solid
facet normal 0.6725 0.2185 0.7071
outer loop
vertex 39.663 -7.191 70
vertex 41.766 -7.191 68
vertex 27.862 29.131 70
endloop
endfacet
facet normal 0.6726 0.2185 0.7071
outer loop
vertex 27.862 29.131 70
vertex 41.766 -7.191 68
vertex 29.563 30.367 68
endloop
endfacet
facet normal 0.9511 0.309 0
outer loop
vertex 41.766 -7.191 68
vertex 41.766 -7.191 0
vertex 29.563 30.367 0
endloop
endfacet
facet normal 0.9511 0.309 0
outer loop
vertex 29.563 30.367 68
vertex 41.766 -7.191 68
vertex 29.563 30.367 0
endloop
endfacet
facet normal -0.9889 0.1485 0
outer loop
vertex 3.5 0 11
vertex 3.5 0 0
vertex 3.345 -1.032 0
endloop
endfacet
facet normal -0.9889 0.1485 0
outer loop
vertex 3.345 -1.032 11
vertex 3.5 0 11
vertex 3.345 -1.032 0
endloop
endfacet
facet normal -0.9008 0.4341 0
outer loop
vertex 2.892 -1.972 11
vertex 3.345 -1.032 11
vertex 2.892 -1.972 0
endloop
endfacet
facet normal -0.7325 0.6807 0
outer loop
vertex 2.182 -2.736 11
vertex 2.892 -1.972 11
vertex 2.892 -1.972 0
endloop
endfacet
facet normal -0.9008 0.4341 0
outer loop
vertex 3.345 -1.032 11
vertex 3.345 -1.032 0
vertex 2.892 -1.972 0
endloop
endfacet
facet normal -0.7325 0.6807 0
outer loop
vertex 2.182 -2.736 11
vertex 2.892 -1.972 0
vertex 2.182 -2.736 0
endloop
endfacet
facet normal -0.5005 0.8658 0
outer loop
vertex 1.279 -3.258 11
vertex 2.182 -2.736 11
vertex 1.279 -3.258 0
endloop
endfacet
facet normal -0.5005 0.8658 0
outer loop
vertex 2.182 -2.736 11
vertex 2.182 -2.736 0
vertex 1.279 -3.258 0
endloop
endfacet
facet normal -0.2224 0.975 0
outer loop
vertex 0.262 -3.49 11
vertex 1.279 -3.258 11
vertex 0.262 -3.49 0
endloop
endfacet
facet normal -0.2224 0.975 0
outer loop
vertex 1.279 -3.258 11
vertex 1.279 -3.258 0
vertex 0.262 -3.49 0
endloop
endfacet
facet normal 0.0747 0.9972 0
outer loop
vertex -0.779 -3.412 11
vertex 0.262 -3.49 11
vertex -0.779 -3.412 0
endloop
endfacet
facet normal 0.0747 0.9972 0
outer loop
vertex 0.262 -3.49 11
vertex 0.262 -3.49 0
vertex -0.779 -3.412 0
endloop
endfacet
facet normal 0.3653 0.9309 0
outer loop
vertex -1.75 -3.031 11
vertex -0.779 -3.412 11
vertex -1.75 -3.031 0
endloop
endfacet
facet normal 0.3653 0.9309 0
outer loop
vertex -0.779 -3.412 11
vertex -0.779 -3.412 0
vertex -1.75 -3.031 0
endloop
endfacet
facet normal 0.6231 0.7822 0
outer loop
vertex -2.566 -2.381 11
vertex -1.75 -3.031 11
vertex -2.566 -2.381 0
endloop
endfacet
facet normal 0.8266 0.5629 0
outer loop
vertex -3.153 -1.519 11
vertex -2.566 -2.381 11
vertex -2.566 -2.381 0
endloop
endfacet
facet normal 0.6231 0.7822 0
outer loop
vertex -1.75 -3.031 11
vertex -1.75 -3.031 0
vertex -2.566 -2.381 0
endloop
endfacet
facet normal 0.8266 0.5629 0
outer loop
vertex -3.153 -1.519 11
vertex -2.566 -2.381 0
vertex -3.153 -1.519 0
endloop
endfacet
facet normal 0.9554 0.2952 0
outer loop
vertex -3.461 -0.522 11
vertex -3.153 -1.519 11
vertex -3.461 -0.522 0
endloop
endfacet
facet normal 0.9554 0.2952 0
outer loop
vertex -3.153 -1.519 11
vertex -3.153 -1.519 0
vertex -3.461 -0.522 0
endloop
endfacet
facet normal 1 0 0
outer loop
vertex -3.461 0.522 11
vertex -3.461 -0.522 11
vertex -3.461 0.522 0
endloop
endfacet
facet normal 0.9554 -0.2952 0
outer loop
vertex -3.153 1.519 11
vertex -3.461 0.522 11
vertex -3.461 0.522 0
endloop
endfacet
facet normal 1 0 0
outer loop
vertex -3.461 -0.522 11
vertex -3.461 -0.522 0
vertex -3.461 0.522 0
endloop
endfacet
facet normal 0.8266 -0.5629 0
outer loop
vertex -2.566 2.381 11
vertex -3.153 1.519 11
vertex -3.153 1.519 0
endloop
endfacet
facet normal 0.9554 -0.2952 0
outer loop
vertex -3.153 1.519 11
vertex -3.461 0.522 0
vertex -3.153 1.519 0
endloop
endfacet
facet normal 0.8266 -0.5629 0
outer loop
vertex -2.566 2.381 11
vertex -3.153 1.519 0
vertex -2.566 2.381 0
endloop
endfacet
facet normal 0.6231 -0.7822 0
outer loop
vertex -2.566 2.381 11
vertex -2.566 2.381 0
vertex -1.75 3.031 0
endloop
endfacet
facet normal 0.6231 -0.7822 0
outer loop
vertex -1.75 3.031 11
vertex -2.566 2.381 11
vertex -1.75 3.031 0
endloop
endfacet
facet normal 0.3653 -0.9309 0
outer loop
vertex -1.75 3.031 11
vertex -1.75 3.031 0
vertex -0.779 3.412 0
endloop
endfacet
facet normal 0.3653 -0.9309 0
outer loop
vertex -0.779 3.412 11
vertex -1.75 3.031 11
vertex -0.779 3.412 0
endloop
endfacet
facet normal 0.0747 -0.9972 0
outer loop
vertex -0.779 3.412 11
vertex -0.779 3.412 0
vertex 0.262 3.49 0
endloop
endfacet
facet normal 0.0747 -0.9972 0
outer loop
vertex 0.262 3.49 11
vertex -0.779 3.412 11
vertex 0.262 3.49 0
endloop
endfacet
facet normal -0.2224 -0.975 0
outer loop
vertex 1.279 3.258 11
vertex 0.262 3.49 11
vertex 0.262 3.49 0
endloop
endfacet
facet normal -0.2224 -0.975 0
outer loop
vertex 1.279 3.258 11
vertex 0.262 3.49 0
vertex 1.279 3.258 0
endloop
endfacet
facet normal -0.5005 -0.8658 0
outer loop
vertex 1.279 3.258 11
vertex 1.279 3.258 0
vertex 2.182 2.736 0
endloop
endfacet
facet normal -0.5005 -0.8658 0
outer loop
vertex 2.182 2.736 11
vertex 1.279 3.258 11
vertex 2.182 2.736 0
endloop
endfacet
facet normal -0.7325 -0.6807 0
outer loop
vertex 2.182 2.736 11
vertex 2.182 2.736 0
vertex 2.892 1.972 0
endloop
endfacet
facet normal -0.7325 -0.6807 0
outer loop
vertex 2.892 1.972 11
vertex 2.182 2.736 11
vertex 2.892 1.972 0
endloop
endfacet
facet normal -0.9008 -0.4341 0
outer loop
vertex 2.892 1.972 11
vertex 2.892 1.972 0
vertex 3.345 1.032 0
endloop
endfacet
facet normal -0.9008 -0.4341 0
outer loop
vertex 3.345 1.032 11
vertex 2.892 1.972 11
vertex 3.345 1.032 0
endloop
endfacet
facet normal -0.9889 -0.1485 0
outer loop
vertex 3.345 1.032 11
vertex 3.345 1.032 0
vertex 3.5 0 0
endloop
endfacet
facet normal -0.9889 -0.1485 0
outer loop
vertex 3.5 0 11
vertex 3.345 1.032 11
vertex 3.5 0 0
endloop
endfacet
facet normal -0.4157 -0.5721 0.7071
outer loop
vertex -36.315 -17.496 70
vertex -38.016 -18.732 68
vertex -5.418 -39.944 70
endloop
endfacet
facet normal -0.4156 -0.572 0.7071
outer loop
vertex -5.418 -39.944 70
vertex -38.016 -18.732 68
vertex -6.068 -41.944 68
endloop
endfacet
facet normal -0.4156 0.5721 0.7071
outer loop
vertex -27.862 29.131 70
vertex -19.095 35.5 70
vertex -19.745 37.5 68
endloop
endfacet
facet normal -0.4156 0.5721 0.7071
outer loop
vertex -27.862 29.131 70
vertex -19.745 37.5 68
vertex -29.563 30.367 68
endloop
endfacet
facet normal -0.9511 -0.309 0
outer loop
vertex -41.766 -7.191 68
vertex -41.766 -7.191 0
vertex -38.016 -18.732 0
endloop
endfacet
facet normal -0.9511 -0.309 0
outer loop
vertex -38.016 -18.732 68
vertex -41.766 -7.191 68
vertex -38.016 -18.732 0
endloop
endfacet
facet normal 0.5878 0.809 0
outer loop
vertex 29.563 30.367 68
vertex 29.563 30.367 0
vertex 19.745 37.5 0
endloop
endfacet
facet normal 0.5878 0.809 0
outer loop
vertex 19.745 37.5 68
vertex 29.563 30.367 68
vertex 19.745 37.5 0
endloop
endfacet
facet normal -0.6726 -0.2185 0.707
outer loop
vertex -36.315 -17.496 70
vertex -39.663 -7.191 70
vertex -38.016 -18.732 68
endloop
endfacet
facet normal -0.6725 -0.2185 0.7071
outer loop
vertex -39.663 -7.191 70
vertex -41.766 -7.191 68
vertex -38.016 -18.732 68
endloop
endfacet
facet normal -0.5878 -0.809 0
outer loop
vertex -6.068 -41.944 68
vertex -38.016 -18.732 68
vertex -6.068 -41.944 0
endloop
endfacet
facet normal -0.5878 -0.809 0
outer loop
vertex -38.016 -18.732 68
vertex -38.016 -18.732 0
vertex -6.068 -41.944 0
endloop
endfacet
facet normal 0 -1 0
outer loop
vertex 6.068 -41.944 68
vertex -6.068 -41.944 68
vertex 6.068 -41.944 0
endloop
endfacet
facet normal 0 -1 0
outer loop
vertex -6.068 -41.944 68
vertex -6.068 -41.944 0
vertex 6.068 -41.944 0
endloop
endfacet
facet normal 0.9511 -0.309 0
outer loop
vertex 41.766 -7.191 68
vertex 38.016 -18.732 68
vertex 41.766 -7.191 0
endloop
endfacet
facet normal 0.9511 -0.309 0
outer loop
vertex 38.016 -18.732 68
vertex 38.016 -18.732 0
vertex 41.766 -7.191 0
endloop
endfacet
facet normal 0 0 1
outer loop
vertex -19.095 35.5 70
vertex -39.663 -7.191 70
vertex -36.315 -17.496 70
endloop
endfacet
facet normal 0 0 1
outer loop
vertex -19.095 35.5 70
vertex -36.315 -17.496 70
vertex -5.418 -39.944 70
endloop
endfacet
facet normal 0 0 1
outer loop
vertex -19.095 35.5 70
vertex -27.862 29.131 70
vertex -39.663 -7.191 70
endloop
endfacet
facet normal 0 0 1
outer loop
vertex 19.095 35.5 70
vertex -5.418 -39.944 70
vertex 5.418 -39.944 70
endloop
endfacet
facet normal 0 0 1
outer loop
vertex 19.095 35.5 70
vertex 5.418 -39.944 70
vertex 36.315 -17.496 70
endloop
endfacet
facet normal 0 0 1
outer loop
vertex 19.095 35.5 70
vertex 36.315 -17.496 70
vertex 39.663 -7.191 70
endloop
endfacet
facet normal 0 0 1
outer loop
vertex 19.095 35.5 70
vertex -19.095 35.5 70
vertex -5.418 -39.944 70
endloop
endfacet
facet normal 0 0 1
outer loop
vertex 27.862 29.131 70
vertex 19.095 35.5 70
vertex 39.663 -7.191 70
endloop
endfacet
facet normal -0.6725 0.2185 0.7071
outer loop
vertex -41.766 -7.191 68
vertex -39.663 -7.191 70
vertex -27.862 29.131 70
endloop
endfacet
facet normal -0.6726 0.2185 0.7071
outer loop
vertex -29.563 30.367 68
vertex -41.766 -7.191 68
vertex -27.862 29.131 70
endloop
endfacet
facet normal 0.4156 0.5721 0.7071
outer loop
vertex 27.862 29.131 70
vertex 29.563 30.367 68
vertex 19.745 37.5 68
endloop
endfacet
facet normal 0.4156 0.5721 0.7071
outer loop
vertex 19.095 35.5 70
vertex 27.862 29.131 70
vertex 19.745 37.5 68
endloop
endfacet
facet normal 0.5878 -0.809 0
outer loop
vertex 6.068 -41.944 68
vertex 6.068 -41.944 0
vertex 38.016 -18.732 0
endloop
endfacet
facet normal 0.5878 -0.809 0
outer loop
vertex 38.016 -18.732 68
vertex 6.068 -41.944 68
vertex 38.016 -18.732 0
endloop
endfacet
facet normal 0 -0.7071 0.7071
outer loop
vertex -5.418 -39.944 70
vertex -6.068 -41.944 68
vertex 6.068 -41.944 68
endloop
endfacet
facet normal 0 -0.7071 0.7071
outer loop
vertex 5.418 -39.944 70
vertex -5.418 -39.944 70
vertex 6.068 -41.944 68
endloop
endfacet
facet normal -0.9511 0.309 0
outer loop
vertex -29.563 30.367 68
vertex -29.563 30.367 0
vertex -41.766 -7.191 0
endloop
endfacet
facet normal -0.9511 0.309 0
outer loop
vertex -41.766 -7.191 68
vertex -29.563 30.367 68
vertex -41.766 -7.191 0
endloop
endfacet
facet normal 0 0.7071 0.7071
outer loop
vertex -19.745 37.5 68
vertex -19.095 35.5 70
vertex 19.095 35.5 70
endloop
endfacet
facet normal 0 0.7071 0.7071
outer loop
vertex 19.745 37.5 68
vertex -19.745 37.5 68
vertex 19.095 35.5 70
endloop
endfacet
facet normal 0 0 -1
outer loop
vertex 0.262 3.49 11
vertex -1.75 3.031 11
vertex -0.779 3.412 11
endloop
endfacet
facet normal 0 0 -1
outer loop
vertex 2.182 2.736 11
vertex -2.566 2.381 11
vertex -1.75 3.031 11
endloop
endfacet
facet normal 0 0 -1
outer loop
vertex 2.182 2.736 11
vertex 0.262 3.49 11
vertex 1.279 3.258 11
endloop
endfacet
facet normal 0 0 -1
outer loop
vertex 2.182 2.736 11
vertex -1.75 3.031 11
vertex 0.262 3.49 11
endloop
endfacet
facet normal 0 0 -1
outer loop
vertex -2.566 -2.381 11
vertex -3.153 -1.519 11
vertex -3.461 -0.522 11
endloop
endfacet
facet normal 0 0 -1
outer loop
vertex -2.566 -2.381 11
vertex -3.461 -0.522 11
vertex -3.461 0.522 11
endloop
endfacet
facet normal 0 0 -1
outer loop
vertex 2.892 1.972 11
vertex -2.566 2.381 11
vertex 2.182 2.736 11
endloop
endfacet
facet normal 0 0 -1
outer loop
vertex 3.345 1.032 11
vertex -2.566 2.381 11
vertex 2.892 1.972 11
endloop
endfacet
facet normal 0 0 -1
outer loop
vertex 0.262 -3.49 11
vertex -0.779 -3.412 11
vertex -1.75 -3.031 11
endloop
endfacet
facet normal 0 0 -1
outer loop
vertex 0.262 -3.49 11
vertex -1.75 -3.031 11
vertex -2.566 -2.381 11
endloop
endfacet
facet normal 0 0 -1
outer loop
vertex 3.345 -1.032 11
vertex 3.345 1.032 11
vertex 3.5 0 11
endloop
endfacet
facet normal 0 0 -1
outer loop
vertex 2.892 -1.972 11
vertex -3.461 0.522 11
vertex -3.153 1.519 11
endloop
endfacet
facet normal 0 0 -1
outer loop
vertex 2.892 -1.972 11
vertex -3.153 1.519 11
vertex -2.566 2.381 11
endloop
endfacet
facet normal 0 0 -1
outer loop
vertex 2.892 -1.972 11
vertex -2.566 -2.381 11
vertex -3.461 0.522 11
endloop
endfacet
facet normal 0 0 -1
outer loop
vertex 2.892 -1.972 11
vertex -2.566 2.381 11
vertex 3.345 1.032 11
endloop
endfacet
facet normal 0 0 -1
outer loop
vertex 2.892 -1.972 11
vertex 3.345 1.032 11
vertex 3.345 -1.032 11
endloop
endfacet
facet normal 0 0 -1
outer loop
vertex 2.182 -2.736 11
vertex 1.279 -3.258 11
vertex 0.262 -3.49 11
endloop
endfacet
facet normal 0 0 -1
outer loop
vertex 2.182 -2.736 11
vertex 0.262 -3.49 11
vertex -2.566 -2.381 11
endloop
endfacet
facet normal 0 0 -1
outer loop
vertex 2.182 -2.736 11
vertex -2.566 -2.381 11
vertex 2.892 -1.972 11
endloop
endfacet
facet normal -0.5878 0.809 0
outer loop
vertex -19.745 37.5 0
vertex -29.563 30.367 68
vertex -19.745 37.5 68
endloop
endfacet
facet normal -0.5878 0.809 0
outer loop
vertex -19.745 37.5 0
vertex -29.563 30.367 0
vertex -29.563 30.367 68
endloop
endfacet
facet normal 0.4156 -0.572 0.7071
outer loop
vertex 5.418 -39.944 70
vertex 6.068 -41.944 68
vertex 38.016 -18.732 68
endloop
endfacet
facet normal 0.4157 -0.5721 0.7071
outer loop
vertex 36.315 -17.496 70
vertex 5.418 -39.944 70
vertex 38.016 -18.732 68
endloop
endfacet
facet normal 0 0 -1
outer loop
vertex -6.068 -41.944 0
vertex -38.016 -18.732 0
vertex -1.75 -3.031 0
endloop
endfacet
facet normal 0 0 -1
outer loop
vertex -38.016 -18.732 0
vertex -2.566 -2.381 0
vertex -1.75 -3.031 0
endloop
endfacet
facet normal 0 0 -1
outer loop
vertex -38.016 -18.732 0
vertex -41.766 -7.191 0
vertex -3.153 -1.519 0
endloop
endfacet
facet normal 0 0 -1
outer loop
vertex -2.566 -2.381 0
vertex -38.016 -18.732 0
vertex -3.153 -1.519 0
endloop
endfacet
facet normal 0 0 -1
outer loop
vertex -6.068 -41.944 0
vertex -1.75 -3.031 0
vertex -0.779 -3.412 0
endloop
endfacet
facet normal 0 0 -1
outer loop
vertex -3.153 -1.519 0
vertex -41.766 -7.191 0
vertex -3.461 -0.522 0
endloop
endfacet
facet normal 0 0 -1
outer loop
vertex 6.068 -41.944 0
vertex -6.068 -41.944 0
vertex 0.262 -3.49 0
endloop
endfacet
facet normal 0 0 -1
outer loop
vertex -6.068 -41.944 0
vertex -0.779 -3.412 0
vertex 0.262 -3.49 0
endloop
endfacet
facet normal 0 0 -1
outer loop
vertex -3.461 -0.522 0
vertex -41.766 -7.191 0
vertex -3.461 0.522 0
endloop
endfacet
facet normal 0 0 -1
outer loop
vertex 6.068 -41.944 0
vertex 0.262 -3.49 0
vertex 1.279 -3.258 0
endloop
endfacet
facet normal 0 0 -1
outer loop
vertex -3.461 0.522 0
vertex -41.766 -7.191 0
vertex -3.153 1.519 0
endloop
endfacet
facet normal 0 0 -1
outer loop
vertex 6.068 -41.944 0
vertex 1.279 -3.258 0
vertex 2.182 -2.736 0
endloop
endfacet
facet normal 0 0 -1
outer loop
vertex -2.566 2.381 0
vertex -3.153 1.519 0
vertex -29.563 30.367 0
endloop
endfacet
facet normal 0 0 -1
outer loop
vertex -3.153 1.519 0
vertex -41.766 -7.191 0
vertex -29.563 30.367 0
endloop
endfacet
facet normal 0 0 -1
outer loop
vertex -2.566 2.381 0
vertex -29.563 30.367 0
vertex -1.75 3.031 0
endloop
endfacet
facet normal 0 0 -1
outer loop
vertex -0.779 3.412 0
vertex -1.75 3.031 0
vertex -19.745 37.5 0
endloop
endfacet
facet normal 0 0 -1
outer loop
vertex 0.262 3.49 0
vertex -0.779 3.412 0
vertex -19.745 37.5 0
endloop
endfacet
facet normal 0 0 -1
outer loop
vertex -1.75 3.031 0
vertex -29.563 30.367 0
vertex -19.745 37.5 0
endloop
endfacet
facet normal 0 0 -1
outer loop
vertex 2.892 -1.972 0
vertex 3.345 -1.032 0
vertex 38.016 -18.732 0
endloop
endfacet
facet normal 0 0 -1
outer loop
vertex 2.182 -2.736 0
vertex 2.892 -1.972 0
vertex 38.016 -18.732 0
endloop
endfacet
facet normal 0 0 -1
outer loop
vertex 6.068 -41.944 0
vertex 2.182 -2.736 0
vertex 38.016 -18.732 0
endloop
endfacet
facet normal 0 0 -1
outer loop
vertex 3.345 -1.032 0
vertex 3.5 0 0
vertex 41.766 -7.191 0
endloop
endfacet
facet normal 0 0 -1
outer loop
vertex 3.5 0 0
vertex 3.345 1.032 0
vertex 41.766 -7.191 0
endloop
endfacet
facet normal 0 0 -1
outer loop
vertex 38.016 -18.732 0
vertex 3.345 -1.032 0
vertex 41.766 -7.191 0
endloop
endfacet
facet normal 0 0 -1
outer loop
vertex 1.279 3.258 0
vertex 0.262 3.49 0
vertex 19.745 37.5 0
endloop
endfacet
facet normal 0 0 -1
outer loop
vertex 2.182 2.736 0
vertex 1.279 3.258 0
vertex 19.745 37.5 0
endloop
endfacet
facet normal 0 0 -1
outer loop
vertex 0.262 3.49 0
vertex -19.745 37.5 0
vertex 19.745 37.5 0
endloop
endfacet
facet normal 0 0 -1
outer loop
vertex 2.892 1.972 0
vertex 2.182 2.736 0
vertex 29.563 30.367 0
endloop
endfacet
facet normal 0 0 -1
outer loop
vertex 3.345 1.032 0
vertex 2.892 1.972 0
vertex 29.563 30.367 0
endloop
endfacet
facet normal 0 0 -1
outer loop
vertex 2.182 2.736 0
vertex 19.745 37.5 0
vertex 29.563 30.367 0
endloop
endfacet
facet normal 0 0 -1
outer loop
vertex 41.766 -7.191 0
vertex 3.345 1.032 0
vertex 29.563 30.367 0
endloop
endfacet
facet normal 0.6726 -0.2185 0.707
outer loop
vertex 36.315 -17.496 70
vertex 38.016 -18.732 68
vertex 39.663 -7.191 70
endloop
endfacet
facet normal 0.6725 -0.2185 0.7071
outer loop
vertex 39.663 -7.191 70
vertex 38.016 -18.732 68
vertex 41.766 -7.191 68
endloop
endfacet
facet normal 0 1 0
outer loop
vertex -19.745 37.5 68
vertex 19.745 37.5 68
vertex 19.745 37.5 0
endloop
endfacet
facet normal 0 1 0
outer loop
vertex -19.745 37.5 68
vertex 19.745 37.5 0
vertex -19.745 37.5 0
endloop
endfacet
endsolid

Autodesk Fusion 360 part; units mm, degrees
sketch "Sketch1" plane through (0, 0, 0) normal (0, 0, 1) x (1, 0, 0)
  line L0 (-29.563, 30.3671) -> (-41.7663, -7.1908)
  line L1 (-38.0163, -18.7321) -> (-6.0676, -41.9442)
  line L2 (6.0676, -41.9442) -> (38.0163, -18.7321)
  line L3 (41.7663, -7.1908) -> (29.563, 30.3671)
  line L4 (19.7453, 37.5) -> (-19.7453, 37.5)
  line L5 (-29.563, 30.3671) -> (-19.7453, 37.5)
  line L6 (-41.7663, -7.1908) -> (-38.0163, -18.7321)
  line L7 (-6.0676, -41.9442) -> (6.0676, -41.9442)
  line L8 (38.0163, -18.7321) -> (41.7663, -7.1908)
  line L9 (29.563, 30.3671) -> (19.7453, 37.5)
  point P0 (-27.2453, 37.5)
  point P1 (-44.0839, -14.3237)
  point P2 (0, -46.3525)
  point P3 (44.0839, -14.3237)
  point P4 (27.2453, 37.5)
extrude "Extrude1" add sketch "Sketch1" along normal blind 70
sketch "Sketch2" plane through (0, 0, 0) normal (0, 0, -1) x (1, 0, 0)
  line L0 (-41.7663, 7.1908) -> (-29.563, -30.3671)
  line L1 (-29.563, -30.3671) -> (-19.7453, -37.5)
  line L2 (-19.7453, -37.5) -> (19.7453, -37.5)
  line L3 (19.7453, -37.5) -> (29.563, -30.3671)
  line L4 (29.563, -30.3671) -> (41.7663, 7.1908)
  line L5 (41.7663, 7.1908) -> (38.0163, 18.7321)
  line L6 (38.0163, 18.7321) -> (6.0676, 41.9442)
  line L7 (6.0676, 41.9442) -> (-6.0676, 41.9442)
  line L8 (-6.0676, 41.9442) -> (-38.0163, 18.7321)
  line L9 (-38.0163, 18.7321) -> (-41.7663, 7.1908)
  circle A0 centre (0, 0) radius 3.5
  dimension "d13" = 7
extrude "Extrude2" cut sketch "Sketch2" against normal blind 11 contours A0
chamfer "Chamfer1" distance 2 angle 45 1 faces at (-0.7952, -10.1031, 70)
